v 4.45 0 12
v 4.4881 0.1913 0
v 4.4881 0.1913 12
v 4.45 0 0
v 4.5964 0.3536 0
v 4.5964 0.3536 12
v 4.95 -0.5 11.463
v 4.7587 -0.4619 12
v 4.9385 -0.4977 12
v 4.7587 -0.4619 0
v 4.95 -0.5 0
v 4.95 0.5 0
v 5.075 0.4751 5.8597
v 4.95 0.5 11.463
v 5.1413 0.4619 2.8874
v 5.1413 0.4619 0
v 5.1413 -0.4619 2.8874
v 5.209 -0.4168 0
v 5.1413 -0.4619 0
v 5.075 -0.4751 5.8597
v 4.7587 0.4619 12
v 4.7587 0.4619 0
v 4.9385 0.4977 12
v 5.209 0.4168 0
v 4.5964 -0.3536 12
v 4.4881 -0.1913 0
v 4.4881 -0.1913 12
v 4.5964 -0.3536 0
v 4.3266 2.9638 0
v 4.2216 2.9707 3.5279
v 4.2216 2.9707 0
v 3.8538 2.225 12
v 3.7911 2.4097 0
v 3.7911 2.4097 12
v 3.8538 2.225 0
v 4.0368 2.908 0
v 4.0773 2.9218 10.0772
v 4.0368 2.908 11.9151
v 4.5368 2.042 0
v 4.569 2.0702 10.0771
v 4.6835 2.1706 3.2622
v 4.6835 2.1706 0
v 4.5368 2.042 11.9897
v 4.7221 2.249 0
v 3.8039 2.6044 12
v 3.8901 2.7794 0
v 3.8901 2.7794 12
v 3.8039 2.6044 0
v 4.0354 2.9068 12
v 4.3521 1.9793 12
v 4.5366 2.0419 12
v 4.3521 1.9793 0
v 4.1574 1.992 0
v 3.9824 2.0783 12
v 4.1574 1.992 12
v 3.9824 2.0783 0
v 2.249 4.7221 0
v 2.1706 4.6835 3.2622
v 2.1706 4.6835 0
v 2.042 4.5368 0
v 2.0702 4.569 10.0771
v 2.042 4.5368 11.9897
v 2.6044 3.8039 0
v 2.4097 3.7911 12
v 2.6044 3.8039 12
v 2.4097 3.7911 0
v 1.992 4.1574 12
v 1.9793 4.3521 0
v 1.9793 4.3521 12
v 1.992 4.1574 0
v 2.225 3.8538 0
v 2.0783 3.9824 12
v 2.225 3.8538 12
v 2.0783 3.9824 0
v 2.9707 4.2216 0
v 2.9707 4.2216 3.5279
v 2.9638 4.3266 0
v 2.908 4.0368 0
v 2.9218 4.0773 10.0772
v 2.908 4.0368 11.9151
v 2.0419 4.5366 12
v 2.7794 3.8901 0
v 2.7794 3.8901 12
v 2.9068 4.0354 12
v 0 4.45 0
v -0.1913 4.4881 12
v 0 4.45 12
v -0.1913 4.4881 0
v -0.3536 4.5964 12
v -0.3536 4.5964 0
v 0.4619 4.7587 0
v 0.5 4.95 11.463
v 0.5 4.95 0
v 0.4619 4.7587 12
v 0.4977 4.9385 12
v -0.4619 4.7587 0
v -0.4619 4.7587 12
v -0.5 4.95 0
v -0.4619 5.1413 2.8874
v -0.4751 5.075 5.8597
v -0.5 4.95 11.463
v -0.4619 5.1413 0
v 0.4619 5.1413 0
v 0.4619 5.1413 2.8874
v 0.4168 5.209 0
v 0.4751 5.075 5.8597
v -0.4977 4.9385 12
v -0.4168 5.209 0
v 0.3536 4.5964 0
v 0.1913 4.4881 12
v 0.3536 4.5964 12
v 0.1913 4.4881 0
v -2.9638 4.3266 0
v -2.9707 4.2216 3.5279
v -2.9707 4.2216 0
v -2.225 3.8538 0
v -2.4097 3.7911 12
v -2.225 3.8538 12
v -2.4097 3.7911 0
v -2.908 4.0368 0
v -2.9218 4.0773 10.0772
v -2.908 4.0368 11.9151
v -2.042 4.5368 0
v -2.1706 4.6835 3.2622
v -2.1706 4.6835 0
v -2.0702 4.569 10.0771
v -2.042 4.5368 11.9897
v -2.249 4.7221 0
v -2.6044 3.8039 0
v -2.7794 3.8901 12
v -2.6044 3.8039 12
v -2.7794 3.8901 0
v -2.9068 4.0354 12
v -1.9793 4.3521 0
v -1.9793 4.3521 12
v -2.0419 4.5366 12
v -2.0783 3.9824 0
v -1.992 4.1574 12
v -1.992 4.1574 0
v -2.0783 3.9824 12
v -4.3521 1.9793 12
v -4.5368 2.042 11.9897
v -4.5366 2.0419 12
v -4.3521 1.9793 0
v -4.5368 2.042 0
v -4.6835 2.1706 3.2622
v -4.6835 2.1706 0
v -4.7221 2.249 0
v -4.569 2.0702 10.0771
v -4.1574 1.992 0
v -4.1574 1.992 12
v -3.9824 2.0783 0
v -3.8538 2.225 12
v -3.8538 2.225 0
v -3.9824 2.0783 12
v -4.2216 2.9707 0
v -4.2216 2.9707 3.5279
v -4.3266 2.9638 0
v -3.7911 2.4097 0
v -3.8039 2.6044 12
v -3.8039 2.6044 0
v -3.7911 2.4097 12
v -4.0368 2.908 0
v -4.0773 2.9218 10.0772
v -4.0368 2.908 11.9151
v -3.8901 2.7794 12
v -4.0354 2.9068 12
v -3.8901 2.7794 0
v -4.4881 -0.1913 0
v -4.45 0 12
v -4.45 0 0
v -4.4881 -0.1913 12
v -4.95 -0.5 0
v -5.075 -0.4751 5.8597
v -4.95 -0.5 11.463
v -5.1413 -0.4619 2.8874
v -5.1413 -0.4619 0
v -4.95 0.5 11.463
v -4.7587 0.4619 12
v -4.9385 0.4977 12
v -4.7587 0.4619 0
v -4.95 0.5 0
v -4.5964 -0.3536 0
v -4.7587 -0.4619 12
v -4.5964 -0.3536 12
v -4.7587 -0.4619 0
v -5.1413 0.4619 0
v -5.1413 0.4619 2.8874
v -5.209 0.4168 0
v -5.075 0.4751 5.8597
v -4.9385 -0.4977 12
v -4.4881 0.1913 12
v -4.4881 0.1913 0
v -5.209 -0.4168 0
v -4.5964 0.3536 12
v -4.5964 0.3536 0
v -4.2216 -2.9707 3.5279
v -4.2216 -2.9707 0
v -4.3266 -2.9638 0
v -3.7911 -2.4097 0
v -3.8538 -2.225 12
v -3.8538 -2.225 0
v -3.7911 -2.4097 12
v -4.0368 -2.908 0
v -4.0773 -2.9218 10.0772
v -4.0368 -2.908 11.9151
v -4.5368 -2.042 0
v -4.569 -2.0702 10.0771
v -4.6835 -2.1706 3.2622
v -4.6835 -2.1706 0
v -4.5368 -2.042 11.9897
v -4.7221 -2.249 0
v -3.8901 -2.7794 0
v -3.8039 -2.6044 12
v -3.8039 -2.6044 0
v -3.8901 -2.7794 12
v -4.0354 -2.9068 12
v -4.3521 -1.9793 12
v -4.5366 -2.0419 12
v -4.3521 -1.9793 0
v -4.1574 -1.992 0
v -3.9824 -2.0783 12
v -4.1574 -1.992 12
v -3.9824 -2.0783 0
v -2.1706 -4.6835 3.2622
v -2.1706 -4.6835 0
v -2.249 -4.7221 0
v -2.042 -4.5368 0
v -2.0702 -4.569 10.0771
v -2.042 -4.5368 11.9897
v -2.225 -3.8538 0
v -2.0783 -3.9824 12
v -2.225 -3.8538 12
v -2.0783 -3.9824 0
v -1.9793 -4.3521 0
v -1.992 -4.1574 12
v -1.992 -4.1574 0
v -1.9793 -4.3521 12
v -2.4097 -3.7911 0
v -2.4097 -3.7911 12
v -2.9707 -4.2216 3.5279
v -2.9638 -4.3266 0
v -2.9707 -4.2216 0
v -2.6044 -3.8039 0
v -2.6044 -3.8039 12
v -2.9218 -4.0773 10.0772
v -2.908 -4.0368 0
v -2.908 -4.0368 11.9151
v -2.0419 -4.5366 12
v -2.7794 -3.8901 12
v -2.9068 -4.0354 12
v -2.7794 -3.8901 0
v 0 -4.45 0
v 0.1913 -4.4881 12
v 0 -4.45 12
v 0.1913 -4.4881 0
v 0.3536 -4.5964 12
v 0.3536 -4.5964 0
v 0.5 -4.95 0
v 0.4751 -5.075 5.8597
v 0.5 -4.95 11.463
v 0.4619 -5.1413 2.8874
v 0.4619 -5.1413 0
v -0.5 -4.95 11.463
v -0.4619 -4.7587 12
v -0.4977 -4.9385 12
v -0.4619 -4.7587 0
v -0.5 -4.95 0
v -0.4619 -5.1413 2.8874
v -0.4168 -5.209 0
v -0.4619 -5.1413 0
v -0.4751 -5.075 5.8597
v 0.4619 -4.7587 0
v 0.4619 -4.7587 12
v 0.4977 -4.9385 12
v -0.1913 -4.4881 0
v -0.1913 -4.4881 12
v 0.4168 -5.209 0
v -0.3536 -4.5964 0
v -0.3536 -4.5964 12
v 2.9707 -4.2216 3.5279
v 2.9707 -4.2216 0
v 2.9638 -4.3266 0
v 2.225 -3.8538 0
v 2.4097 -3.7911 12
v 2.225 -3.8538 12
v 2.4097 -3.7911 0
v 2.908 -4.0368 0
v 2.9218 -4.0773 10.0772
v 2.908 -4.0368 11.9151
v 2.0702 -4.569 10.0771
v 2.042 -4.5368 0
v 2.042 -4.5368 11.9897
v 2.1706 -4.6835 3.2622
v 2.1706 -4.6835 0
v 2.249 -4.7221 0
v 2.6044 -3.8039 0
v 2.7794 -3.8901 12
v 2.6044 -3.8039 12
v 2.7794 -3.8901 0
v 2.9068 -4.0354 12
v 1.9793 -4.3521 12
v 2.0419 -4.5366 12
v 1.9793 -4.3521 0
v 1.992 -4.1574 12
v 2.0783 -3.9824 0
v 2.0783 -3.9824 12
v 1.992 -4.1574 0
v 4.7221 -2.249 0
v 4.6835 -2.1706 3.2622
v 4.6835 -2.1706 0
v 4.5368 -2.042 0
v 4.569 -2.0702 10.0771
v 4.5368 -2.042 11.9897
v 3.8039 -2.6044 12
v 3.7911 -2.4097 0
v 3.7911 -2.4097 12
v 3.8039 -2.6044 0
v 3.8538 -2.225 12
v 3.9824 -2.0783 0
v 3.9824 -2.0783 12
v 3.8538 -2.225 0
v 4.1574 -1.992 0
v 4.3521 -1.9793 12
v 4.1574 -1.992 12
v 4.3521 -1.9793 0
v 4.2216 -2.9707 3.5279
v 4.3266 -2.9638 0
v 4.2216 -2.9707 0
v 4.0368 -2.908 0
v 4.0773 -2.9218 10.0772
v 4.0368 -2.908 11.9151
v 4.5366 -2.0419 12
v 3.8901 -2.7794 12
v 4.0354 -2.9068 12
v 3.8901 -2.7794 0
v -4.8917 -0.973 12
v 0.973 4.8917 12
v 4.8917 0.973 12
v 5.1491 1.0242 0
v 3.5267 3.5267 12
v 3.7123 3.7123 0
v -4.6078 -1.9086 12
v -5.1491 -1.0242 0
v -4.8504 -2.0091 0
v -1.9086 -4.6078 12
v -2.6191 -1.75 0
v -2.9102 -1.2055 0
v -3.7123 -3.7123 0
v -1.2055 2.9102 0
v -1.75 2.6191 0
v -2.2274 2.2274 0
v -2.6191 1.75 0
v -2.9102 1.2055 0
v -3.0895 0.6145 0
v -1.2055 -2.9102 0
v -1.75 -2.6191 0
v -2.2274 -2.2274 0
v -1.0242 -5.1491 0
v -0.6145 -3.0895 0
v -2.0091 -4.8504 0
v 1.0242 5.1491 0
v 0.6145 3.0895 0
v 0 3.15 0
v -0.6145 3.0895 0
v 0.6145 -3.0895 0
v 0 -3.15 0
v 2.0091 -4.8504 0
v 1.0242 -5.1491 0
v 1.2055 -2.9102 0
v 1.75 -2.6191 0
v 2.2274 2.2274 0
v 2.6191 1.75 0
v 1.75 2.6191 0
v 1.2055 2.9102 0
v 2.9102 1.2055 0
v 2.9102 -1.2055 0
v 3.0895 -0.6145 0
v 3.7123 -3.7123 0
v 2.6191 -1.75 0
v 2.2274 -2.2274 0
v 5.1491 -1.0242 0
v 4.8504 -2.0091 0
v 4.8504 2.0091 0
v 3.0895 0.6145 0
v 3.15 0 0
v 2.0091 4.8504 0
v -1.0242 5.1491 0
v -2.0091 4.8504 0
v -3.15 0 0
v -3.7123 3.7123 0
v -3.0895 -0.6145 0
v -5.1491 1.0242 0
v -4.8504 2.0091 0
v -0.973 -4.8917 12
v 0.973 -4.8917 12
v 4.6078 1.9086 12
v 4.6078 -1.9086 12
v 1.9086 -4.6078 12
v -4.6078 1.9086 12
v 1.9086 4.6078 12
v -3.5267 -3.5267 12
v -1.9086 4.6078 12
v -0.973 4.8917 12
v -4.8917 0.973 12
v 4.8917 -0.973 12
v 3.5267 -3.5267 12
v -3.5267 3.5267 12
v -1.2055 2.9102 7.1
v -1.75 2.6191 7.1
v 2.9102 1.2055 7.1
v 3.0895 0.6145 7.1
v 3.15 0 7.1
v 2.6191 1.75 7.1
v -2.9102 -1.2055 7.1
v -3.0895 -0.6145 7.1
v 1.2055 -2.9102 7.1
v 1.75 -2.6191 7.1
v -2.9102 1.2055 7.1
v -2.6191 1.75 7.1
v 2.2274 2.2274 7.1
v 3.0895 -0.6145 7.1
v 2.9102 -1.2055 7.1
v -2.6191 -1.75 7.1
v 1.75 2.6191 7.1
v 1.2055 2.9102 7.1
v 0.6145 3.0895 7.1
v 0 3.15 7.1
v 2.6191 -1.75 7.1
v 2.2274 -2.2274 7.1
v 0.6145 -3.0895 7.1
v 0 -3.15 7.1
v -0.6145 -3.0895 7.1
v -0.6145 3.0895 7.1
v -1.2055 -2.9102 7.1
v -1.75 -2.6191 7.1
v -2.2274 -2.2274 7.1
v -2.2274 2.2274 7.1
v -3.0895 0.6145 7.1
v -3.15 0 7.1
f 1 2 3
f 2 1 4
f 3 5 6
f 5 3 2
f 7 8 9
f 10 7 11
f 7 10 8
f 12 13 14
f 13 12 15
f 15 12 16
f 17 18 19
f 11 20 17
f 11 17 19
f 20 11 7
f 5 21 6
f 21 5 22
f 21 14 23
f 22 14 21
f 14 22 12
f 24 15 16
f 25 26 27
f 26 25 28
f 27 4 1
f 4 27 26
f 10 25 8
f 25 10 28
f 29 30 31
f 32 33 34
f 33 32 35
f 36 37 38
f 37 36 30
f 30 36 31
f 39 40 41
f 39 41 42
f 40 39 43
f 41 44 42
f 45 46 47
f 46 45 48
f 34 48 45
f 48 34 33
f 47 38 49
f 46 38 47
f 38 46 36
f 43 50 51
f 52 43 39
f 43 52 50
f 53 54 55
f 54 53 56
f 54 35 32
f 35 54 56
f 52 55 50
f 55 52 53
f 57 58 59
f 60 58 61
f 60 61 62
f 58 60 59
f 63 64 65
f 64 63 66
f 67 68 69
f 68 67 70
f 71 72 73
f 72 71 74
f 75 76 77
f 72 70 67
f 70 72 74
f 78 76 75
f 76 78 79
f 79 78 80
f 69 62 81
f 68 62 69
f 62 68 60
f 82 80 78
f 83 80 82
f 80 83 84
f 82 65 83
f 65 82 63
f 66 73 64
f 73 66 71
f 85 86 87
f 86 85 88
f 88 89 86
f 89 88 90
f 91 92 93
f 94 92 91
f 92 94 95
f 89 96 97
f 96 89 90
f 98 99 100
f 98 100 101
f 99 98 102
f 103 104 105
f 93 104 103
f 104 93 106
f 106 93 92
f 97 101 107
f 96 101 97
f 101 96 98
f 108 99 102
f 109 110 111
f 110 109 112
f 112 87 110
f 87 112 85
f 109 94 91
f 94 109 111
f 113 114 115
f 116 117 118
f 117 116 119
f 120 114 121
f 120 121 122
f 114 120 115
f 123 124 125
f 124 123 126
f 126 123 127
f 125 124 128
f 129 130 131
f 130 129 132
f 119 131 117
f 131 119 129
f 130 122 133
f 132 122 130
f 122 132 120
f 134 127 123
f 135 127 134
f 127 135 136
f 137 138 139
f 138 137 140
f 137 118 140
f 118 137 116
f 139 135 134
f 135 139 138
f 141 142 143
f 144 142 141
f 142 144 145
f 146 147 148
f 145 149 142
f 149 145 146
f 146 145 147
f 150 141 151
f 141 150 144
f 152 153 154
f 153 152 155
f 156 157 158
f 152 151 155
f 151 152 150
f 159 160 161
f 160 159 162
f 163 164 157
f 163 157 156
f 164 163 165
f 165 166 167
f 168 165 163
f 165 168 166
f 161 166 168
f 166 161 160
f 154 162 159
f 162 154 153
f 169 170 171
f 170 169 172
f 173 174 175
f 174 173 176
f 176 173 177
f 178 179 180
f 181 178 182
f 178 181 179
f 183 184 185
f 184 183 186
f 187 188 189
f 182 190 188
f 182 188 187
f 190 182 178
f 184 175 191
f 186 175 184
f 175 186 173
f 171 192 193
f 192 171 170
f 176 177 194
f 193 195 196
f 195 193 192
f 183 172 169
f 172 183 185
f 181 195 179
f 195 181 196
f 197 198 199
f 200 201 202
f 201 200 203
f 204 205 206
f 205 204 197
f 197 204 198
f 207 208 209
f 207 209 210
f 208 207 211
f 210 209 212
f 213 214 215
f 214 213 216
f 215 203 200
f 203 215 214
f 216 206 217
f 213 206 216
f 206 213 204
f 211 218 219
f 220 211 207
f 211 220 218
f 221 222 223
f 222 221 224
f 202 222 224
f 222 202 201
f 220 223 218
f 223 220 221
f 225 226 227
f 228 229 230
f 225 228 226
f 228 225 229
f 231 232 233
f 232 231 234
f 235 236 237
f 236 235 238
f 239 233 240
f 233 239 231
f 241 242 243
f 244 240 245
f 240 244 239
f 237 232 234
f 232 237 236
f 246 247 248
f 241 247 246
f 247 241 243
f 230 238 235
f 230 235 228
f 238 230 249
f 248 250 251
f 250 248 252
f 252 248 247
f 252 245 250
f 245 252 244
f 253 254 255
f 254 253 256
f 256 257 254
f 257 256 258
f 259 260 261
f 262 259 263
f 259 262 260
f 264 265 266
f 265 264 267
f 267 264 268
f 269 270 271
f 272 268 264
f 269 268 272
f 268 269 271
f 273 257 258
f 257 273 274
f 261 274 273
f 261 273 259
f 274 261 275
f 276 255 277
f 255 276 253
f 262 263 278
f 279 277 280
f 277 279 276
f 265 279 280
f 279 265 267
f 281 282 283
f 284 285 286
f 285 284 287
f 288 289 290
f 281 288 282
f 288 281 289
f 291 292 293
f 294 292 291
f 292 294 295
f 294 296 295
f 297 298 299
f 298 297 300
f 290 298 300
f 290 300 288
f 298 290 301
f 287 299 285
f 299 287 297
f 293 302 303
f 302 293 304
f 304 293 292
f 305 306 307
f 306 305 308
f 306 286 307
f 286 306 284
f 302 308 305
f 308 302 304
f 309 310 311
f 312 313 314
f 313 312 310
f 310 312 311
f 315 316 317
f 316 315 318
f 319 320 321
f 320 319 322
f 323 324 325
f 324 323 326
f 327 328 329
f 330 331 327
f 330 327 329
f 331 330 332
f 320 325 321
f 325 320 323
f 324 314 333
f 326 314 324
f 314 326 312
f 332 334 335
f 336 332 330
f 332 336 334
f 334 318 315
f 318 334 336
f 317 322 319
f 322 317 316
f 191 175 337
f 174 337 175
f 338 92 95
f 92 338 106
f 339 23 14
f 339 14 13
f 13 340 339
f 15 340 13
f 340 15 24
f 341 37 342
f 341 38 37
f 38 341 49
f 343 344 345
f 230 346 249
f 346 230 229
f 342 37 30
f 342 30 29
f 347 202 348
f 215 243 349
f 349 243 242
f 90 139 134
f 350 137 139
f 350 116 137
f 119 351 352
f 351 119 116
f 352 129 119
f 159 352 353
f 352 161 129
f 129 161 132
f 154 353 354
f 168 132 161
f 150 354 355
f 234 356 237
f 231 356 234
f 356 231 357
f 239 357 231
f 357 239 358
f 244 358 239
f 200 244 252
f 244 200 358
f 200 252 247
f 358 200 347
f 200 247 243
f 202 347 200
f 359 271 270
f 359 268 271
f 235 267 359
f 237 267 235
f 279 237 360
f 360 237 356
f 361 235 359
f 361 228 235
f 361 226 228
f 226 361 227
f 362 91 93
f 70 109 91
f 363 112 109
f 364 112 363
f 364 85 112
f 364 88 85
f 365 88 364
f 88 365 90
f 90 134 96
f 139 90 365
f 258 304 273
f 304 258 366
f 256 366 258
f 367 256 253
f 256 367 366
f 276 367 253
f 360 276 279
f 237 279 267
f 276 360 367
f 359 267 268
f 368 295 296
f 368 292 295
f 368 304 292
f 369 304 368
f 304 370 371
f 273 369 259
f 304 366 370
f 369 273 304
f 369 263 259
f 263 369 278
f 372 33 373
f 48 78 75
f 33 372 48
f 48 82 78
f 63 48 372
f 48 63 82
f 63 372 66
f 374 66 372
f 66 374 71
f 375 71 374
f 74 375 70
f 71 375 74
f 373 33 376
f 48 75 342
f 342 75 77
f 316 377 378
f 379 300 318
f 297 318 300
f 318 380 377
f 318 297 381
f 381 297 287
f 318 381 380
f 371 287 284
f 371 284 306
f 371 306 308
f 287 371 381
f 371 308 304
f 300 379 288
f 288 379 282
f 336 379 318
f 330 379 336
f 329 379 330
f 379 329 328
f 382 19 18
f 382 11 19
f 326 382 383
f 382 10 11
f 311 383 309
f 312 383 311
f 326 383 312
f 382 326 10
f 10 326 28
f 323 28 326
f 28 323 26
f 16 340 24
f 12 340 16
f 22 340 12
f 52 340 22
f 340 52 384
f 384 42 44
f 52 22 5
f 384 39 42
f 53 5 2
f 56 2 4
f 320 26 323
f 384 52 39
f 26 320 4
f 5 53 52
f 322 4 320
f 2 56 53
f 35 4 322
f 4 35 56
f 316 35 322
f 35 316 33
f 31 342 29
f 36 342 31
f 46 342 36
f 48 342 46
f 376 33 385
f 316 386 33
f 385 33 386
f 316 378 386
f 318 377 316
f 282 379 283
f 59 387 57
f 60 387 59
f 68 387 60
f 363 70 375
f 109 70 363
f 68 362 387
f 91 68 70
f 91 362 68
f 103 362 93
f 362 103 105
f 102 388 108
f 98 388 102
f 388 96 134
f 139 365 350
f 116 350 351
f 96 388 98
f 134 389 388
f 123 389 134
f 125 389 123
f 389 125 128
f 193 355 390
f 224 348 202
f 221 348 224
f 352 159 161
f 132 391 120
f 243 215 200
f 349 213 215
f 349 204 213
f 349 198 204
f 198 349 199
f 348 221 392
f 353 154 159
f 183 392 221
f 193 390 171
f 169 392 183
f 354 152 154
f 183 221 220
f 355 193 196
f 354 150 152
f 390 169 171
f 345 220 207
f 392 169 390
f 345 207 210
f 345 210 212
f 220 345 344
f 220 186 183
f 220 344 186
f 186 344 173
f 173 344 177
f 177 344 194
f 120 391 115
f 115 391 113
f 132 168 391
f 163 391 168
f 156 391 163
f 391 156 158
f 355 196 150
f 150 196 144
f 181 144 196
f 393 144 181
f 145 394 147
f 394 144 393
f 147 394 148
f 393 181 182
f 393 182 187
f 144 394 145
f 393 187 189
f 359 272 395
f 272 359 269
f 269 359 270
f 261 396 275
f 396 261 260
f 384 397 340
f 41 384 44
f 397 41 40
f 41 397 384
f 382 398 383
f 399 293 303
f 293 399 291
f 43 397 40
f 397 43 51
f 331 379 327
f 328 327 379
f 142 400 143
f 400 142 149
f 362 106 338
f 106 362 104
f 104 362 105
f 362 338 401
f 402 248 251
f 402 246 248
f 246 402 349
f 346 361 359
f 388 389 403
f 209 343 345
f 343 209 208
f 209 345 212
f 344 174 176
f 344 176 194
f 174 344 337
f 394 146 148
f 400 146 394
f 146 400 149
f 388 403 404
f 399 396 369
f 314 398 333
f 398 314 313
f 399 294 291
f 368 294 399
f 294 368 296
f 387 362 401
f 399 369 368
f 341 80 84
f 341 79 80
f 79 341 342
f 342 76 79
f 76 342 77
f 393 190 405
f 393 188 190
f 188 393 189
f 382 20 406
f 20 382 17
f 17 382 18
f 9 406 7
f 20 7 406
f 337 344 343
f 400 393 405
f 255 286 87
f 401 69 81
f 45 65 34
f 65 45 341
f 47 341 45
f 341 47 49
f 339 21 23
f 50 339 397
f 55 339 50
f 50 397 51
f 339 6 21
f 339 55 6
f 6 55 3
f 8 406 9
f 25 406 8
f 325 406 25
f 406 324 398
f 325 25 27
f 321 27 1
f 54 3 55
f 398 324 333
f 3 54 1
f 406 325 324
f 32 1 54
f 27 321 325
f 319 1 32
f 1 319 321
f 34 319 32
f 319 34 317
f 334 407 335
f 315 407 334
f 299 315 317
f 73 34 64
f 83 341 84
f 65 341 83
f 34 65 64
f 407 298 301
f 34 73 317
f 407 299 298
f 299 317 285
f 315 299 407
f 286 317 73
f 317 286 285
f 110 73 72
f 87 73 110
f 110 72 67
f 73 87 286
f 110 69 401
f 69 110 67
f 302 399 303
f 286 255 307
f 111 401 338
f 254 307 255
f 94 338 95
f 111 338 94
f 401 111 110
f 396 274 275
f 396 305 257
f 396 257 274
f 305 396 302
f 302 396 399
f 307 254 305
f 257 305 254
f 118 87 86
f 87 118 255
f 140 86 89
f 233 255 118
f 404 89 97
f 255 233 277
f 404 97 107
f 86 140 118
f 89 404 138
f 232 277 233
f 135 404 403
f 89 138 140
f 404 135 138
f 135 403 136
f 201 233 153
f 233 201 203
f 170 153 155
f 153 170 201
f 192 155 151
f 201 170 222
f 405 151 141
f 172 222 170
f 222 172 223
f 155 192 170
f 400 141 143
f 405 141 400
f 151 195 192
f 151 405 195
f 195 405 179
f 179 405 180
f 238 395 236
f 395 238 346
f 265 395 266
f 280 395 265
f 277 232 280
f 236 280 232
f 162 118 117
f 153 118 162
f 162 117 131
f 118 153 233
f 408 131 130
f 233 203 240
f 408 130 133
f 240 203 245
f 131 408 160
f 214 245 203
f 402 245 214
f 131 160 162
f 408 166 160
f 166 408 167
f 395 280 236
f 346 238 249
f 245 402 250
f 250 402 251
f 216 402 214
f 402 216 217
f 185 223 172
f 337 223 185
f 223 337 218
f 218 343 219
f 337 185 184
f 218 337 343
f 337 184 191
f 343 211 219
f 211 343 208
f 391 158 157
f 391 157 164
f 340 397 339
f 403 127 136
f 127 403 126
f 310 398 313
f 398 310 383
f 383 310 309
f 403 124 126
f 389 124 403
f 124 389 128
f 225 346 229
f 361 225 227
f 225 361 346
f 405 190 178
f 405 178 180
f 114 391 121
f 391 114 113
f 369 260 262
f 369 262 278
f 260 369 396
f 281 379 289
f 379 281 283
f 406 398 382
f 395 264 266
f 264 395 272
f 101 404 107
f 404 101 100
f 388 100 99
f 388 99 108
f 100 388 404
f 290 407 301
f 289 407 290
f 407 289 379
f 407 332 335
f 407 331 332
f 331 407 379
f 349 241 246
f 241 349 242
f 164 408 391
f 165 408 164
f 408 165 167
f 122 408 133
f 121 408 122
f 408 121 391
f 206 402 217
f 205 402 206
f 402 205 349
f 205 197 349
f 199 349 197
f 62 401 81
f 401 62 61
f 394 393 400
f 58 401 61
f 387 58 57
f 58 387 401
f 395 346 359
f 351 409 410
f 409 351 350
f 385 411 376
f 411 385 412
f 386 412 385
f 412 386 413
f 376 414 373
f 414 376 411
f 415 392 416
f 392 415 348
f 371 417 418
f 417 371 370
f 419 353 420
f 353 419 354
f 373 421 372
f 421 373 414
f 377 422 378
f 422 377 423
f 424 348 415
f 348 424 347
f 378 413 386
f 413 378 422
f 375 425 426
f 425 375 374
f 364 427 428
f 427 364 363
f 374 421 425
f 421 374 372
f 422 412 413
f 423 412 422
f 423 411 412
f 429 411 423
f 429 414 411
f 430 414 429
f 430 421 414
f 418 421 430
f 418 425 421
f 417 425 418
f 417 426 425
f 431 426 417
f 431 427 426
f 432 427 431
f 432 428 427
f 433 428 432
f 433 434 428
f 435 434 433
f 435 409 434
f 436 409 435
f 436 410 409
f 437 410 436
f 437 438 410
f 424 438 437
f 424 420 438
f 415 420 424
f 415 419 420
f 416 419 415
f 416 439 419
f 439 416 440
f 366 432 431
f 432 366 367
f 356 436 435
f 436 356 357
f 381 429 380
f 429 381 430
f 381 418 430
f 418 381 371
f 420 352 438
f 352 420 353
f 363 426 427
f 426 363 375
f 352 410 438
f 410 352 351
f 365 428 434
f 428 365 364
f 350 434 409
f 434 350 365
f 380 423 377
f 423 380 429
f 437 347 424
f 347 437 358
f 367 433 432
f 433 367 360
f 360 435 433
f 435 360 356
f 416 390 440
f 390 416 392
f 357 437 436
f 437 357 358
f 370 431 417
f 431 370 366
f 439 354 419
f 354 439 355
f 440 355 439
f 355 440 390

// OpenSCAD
// ACCESS KNOB — Din Sync RE-303 Volume / Power Knob
// Generated via CLI for Studio Knobs
module access_knob_re303_vol() {
  outer_d = 10.5;
  height = 12;
  taper = 0.95;
  bore_d = 6;
  slot_h = 7;
  tex_depth = 0.6;
  tex_scale = 1;
  tex_count = 12;

  difference() {
    cylinder(h=height, d1=outer_d, d2=outer_d*taper, $fn=32);
    translate([0,0,-0.1]) cylinder(h=slot_h+0.2, d=bore_d + 0.3, $fn=32);
    for(i=[0:tex_count-1]) {
      rotate([0,0,i*(360/tex_count)])
        translate([outer_d/2-tex_depth/2, 0, height/2])
          cylinder(h=height*1.1, d=tex_scale, center=true, $fn=16);
    }
  }
}
access_knob_re303_vol();
